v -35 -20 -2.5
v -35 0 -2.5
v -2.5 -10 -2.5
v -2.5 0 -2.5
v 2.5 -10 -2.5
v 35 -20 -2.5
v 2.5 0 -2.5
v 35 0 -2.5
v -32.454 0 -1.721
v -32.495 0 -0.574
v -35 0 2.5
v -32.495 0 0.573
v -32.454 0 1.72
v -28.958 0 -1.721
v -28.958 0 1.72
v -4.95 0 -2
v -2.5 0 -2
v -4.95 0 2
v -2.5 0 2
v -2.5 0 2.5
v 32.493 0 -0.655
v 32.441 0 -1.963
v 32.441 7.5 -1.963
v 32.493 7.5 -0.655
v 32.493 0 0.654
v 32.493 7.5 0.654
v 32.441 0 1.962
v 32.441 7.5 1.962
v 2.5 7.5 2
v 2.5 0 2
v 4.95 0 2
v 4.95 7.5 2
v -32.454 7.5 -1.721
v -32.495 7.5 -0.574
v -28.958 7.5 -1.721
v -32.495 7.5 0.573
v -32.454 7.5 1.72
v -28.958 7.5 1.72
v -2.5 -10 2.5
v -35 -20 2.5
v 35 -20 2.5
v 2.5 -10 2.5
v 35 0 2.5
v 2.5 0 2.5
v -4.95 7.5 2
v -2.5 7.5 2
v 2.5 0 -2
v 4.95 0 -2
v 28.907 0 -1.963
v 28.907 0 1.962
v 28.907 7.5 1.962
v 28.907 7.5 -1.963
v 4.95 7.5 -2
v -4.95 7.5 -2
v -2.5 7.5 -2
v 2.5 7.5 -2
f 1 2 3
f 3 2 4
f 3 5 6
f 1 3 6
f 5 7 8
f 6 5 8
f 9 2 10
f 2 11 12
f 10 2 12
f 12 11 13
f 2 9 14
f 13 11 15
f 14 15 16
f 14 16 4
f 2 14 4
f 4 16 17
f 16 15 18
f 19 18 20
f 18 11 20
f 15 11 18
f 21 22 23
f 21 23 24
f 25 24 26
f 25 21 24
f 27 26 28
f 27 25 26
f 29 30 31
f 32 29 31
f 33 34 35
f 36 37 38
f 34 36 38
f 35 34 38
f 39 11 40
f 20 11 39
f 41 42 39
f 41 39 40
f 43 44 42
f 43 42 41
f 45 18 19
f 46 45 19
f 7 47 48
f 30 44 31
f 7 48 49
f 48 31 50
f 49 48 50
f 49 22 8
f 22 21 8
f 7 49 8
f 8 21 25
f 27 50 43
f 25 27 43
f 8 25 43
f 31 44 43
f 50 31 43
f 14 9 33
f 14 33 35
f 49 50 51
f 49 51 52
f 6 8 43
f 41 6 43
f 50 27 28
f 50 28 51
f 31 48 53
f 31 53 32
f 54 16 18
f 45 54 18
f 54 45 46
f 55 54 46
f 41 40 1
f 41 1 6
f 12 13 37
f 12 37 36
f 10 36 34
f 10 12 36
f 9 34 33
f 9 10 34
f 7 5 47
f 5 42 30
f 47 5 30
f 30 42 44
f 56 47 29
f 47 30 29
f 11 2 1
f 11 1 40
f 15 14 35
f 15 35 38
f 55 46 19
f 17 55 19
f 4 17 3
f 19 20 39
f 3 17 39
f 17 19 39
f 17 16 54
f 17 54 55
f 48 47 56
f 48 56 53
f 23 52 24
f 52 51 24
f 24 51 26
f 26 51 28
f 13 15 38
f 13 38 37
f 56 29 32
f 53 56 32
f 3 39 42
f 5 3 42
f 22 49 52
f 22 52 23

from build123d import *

# Parameters (mm, degrees)
F0_W     = 70
F0_H     = 5
F1_DEPTH = 20
F3_DEPTH = 2.501
F4_DEPTH = 2.501
F5_W     = 2.45
F5_H     = 4
F6_DEPTH = 7.5


with BuildPart() as f1:
    # F0 (on Front) → F1 (new body)
    with BuildSketch(Plane.XZ):
        Rectangle(F0_W, F0_H)
    extrude(amount=F1_DEPTH)

    # F2 (on Top) → F3 (cut, through all)
    with BuildSketch(Plane.XY):
        Polygon((2.5, 0), (0, 0), (-2.5, 0), (-2.5, -10), (2.5, -10), align=None)
    extrude(amount=-F3_DEPTH, mode=Mode.SUBTRACT)

    # F2 (on Top) → F4 (cut, through all)
    with BuildSketch(Plane.XY):
        Polygon((2.5, 0), (0, 0), (-2.5, 0), (-2.5, -10), (2.5, -10), align=None)
    extrude(amount=F4_DEPTH, mode=Mode.SUBTRACT)

    # F5 (on Front) → F6 (join)
    with BuildSketch(Plane.XZ):
        with BuildLine():
            Line((28.90652, -1.963228), (32.440649, -1.963228))
            ThreePointArc((32.440649, -1.963228), (32.5, -0.00059), (32.440721, 1.962049))
            Line((32.440721, 1.962049), (28.90652, 1.962049))
            Line((28.90652, 1.962049), (28.90652, -1.963228))
        make_face()
        with BuildLine():
            Line((-28.95826, 1.719714), (-32.454469, 1.719714))
            ThreePointArc((-32.454469, 1.719714), (-32.5, -0.000563), (-32.45441, -1.720838))
            Line((-32.45441, -1.720838), (-28.95826, -1.720838))
            Line((-28.95826, -1.720838), (-28.95826, 1.719714))
        make_face()
        with Locations((-3.725, 0)):
            Rectangle(F5_W, F5_H)
        with Locations((3.725, 0)):
            Rectangle(F5_W, F5_H)
    extrude(amount=-F6_DEPTH)


solid = f1.part
